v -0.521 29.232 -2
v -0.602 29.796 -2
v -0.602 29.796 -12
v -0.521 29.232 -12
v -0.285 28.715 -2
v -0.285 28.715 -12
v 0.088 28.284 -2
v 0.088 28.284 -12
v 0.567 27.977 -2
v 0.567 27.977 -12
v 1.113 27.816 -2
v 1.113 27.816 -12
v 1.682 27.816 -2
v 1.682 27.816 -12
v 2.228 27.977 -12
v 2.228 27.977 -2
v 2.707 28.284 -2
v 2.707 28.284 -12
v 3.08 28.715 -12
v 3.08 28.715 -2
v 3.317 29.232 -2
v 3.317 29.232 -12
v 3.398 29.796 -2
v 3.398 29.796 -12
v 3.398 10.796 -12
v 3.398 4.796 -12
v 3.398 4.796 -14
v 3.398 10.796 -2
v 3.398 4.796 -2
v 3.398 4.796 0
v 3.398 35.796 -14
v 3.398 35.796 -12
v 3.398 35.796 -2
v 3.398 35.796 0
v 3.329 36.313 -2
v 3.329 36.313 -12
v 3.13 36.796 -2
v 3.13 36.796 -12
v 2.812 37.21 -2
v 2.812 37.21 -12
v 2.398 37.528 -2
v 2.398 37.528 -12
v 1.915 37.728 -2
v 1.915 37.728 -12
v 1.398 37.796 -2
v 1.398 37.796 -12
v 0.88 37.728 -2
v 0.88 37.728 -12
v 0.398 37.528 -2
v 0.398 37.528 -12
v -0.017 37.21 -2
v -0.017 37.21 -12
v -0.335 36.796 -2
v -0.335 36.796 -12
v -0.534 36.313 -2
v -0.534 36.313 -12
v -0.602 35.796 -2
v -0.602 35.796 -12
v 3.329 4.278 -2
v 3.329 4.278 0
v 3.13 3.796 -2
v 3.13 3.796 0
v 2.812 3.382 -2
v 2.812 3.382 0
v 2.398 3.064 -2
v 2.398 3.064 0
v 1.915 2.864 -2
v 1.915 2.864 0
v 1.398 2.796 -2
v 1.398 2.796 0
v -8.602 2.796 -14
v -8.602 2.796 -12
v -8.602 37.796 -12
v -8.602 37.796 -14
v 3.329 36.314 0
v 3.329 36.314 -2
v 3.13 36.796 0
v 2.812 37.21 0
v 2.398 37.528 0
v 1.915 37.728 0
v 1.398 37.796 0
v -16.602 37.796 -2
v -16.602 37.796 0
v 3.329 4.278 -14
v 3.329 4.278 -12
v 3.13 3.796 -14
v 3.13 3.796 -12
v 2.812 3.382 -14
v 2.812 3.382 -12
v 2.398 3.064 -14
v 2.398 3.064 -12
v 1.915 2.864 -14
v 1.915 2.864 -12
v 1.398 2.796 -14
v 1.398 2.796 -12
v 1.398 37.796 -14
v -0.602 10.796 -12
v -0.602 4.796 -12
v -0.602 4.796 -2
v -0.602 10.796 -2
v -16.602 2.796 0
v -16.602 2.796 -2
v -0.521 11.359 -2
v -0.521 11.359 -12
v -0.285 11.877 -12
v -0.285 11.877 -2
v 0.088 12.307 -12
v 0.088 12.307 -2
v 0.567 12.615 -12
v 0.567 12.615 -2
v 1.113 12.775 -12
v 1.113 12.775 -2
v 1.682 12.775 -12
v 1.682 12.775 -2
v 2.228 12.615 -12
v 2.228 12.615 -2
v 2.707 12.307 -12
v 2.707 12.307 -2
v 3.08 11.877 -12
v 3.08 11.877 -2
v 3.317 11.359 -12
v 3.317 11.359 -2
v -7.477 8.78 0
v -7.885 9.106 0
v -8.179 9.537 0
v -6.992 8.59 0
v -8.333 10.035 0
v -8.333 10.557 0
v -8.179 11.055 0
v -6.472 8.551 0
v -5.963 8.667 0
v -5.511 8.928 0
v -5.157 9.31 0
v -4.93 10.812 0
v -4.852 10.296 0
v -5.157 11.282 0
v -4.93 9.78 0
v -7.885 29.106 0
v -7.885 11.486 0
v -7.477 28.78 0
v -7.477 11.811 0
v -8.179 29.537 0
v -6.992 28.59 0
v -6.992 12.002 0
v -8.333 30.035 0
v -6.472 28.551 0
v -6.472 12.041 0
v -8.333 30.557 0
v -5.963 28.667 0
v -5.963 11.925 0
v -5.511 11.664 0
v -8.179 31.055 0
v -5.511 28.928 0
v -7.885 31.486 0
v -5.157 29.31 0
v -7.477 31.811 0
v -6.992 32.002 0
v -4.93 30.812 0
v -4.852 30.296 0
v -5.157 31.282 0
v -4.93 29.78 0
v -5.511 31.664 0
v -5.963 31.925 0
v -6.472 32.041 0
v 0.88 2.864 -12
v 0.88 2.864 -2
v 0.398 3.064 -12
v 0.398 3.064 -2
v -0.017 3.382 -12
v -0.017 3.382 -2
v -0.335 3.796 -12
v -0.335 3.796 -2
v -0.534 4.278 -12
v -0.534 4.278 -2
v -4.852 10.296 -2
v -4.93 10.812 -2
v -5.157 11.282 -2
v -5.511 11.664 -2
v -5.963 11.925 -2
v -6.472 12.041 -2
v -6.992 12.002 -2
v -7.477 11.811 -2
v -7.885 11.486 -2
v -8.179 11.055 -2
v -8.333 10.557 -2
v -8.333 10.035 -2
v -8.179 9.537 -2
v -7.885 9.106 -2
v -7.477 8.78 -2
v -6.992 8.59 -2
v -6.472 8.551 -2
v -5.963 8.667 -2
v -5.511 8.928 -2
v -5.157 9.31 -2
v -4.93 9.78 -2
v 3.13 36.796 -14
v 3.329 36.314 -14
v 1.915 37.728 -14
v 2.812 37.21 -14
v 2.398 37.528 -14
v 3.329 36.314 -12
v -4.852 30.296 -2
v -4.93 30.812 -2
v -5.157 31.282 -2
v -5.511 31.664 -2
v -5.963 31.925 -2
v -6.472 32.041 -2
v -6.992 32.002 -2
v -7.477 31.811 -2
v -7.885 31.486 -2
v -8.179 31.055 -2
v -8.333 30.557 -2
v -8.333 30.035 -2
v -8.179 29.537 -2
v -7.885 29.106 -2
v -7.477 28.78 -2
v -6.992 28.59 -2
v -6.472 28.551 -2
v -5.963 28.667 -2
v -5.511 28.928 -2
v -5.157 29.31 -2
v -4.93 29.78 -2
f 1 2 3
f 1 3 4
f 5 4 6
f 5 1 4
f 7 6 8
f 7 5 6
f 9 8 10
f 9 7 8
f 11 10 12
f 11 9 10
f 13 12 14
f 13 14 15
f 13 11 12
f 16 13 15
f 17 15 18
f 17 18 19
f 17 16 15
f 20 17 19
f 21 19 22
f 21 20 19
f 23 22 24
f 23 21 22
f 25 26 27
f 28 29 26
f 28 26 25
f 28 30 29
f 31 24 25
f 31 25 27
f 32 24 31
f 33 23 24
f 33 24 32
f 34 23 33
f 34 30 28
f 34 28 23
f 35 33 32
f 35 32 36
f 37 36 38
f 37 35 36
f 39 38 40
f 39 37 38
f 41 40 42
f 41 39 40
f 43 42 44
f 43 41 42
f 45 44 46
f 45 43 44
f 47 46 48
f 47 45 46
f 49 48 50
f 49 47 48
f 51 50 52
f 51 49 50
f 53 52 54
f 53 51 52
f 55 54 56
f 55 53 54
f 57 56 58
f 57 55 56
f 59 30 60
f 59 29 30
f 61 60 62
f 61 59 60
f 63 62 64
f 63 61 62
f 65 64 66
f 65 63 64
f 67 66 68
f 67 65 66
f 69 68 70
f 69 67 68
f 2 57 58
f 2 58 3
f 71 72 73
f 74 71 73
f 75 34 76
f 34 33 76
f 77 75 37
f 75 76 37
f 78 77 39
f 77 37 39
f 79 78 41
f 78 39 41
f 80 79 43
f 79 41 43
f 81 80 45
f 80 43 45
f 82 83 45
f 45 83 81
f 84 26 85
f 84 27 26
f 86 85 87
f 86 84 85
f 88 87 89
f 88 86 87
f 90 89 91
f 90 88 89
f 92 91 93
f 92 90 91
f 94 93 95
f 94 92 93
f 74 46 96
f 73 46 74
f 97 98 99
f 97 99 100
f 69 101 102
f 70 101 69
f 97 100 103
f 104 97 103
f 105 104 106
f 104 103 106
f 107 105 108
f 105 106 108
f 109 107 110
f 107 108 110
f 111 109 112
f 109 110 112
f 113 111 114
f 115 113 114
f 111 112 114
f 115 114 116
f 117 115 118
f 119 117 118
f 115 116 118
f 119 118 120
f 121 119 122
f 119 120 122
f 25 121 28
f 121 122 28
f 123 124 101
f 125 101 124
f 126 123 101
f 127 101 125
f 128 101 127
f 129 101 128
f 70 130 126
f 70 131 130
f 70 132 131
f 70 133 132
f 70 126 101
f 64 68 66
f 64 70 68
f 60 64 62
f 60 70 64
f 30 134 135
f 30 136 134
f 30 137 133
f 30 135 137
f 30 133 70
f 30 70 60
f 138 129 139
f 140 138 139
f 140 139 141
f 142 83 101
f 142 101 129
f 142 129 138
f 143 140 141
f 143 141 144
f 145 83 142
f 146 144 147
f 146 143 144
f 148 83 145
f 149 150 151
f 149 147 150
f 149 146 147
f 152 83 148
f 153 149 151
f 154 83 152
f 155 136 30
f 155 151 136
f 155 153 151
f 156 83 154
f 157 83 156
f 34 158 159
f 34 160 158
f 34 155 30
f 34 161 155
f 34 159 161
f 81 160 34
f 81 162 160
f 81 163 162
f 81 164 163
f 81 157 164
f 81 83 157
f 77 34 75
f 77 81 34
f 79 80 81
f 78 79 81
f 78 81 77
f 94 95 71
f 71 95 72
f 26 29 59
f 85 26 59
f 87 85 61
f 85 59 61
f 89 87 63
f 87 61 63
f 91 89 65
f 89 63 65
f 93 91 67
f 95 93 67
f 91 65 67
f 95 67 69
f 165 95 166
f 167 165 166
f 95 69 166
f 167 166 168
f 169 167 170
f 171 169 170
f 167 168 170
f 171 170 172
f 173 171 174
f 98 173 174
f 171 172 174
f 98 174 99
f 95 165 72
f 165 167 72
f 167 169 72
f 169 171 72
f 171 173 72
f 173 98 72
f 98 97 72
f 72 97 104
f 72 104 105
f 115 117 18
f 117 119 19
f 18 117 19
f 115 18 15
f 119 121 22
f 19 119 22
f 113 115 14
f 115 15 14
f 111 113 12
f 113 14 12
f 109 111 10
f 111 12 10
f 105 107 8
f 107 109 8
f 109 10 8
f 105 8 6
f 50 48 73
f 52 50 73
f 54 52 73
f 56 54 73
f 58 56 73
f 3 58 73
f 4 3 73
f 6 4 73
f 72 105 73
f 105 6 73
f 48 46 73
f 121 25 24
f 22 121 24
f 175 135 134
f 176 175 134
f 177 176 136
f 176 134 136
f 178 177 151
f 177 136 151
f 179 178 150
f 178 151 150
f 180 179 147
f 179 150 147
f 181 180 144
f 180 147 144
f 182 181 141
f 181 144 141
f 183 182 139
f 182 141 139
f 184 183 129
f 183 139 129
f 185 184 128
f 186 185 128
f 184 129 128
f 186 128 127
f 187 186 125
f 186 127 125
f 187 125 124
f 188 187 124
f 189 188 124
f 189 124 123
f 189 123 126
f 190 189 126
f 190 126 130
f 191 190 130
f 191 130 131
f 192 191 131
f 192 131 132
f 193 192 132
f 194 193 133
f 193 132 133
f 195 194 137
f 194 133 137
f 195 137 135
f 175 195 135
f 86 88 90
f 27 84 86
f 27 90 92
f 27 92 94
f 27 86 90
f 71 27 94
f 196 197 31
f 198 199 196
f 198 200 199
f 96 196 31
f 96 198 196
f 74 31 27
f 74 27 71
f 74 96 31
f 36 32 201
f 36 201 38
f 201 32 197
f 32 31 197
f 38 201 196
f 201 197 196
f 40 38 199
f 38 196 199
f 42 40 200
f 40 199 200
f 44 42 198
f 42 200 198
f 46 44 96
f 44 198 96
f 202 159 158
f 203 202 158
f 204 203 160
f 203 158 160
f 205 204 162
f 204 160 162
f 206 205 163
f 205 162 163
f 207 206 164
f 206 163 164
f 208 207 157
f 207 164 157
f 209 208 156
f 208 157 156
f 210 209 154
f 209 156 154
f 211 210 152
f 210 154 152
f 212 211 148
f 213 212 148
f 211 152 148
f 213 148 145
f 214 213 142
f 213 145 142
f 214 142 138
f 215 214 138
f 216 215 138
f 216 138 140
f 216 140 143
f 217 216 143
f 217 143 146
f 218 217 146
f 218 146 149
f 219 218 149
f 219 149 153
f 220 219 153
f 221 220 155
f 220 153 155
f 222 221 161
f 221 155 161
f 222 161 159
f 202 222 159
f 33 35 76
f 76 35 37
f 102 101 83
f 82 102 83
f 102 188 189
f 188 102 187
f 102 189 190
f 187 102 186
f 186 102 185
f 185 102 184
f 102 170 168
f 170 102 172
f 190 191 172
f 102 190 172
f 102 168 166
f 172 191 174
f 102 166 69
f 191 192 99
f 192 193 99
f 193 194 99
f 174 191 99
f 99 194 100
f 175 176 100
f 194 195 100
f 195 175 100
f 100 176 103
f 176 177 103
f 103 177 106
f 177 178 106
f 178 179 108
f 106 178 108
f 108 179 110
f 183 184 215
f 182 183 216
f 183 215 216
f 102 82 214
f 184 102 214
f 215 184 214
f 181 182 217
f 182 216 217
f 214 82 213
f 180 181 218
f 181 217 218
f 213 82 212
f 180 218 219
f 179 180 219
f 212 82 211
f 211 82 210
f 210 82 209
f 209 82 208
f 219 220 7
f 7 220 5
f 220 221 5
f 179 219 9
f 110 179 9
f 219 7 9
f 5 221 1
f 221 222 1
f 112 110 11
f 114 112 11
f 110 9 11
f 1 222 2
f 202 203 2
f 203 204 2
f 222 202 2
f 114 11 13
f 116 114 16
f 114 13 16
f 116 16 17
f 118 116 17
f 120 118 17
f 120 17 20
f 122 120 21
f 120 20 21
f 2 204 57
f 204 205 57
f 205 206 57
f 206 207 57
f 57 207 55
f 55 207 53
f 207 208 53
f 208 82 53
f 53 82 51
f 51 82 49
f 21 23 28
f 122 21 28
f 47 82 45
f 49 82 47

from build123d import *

# Parameters (mm, degrees)
ESQUISSE1_W        = 20
ESQUISSE1_H        = 35
ESQUISSE1_R        = 1.75
BOSS_EXTRU_1_DEPTH = 2
BOSS_EXTRU_2_DEPTH = 10
ESQUISSE3_W        = 12
ESQUISSE3_H        = 35
BOSS_EXTRU_3_DEPTH = 2
CONG_1_R           = 2


with BuildPart() as part:
    # Esquisse1 → Boss.-Extru.1 (new body)
    with BuildSketch(Plane.XY):
        with Locations((-6.602456785, 20.295838232)):
            Rectangle(ESQUISSE1_W, ESQUISSE1_H)
        with Locations((-6.602456785, 30.295838232)):
            Circle(ESQUISSE1_R, mode=Mode.SUBTRACT)
        with Locations((-6.602456785, 10.295838232)):
            Circle(ESQUISSE1_R, mode=Mode.SUBTRACT)
    extrude(amount=-BOSS_EXTRU_1_DEPTH)

    # Esquisse2 → Boss.-Extru.2 (add)
    with BuildSketch(Plane(origin=(0, 0, -2), x_dir=(-1, 0, 0), z_dir=(0, 0, -1))):
        with BuildLine():
            Line((0.602456785, 35.795838232), (0.602456785, 29.795838232))
            ThreePointArc((0.602456785, 29.795838232), (-1.397543215, 27.795838232), (-3.397543215, 29.795838232))
            Line((-3.397543215, 29.795838232), (-3.397543215, 35.795838232))
            ThreePointArc((-3.397543215, 35.795838232), (-1.397543215, 37.795838232), (0.602456785, 35.795838232))
        make_face()
        with BuildLine():
            Line((0.602456785, 4.795838232), (0.602456785, 10.795838232))
            ThreePointArc((0.602456785, 10.795838232), (-1.397543215, 12.795838232), (-3.397543215, 10.795838232))
            Line((-3.397543215, 10.795838232), (-3.397543215, 4.795838232))
            ThreePointArc((-3.397543215, 4.795838232), (-1.397543215, 2.795838232), (0.602456785, 4.795838232))
        make_face()
    extrude(amount=BOSS_EXTRU_2_DEPTH)

    # Esquisse3 → Boss.-Extru.3 (add)
    with BuildSketch(Plane(origin=(0, 0, -12), x_dir=(-1, 0, 0), z_dir=(0, 0, -1))):
        with Locations((2.602456785, 20.295838232)):
            Rectangle(ESQUISSE3_W, ESQUISSE3_H)
    extrude(amount=BOSS_EXTRU_3_DEPTH)

    # Congé1
    cong_1_edges = [part.edges().sort_by_distance(p)[0] for p in [
        (3.397543215, 2.795838232, -1),
        (3.397543215, 37.795838232, -13),
        (3.397543215, 2.795838232, -13),
        (3.397543215, 37.795838232, -1),
    ]]
    fillet(cong_1_edges, radius=CONG_1_R - 0.0001)  # a hair under: the kernel refuses the full size


solid = part.part
